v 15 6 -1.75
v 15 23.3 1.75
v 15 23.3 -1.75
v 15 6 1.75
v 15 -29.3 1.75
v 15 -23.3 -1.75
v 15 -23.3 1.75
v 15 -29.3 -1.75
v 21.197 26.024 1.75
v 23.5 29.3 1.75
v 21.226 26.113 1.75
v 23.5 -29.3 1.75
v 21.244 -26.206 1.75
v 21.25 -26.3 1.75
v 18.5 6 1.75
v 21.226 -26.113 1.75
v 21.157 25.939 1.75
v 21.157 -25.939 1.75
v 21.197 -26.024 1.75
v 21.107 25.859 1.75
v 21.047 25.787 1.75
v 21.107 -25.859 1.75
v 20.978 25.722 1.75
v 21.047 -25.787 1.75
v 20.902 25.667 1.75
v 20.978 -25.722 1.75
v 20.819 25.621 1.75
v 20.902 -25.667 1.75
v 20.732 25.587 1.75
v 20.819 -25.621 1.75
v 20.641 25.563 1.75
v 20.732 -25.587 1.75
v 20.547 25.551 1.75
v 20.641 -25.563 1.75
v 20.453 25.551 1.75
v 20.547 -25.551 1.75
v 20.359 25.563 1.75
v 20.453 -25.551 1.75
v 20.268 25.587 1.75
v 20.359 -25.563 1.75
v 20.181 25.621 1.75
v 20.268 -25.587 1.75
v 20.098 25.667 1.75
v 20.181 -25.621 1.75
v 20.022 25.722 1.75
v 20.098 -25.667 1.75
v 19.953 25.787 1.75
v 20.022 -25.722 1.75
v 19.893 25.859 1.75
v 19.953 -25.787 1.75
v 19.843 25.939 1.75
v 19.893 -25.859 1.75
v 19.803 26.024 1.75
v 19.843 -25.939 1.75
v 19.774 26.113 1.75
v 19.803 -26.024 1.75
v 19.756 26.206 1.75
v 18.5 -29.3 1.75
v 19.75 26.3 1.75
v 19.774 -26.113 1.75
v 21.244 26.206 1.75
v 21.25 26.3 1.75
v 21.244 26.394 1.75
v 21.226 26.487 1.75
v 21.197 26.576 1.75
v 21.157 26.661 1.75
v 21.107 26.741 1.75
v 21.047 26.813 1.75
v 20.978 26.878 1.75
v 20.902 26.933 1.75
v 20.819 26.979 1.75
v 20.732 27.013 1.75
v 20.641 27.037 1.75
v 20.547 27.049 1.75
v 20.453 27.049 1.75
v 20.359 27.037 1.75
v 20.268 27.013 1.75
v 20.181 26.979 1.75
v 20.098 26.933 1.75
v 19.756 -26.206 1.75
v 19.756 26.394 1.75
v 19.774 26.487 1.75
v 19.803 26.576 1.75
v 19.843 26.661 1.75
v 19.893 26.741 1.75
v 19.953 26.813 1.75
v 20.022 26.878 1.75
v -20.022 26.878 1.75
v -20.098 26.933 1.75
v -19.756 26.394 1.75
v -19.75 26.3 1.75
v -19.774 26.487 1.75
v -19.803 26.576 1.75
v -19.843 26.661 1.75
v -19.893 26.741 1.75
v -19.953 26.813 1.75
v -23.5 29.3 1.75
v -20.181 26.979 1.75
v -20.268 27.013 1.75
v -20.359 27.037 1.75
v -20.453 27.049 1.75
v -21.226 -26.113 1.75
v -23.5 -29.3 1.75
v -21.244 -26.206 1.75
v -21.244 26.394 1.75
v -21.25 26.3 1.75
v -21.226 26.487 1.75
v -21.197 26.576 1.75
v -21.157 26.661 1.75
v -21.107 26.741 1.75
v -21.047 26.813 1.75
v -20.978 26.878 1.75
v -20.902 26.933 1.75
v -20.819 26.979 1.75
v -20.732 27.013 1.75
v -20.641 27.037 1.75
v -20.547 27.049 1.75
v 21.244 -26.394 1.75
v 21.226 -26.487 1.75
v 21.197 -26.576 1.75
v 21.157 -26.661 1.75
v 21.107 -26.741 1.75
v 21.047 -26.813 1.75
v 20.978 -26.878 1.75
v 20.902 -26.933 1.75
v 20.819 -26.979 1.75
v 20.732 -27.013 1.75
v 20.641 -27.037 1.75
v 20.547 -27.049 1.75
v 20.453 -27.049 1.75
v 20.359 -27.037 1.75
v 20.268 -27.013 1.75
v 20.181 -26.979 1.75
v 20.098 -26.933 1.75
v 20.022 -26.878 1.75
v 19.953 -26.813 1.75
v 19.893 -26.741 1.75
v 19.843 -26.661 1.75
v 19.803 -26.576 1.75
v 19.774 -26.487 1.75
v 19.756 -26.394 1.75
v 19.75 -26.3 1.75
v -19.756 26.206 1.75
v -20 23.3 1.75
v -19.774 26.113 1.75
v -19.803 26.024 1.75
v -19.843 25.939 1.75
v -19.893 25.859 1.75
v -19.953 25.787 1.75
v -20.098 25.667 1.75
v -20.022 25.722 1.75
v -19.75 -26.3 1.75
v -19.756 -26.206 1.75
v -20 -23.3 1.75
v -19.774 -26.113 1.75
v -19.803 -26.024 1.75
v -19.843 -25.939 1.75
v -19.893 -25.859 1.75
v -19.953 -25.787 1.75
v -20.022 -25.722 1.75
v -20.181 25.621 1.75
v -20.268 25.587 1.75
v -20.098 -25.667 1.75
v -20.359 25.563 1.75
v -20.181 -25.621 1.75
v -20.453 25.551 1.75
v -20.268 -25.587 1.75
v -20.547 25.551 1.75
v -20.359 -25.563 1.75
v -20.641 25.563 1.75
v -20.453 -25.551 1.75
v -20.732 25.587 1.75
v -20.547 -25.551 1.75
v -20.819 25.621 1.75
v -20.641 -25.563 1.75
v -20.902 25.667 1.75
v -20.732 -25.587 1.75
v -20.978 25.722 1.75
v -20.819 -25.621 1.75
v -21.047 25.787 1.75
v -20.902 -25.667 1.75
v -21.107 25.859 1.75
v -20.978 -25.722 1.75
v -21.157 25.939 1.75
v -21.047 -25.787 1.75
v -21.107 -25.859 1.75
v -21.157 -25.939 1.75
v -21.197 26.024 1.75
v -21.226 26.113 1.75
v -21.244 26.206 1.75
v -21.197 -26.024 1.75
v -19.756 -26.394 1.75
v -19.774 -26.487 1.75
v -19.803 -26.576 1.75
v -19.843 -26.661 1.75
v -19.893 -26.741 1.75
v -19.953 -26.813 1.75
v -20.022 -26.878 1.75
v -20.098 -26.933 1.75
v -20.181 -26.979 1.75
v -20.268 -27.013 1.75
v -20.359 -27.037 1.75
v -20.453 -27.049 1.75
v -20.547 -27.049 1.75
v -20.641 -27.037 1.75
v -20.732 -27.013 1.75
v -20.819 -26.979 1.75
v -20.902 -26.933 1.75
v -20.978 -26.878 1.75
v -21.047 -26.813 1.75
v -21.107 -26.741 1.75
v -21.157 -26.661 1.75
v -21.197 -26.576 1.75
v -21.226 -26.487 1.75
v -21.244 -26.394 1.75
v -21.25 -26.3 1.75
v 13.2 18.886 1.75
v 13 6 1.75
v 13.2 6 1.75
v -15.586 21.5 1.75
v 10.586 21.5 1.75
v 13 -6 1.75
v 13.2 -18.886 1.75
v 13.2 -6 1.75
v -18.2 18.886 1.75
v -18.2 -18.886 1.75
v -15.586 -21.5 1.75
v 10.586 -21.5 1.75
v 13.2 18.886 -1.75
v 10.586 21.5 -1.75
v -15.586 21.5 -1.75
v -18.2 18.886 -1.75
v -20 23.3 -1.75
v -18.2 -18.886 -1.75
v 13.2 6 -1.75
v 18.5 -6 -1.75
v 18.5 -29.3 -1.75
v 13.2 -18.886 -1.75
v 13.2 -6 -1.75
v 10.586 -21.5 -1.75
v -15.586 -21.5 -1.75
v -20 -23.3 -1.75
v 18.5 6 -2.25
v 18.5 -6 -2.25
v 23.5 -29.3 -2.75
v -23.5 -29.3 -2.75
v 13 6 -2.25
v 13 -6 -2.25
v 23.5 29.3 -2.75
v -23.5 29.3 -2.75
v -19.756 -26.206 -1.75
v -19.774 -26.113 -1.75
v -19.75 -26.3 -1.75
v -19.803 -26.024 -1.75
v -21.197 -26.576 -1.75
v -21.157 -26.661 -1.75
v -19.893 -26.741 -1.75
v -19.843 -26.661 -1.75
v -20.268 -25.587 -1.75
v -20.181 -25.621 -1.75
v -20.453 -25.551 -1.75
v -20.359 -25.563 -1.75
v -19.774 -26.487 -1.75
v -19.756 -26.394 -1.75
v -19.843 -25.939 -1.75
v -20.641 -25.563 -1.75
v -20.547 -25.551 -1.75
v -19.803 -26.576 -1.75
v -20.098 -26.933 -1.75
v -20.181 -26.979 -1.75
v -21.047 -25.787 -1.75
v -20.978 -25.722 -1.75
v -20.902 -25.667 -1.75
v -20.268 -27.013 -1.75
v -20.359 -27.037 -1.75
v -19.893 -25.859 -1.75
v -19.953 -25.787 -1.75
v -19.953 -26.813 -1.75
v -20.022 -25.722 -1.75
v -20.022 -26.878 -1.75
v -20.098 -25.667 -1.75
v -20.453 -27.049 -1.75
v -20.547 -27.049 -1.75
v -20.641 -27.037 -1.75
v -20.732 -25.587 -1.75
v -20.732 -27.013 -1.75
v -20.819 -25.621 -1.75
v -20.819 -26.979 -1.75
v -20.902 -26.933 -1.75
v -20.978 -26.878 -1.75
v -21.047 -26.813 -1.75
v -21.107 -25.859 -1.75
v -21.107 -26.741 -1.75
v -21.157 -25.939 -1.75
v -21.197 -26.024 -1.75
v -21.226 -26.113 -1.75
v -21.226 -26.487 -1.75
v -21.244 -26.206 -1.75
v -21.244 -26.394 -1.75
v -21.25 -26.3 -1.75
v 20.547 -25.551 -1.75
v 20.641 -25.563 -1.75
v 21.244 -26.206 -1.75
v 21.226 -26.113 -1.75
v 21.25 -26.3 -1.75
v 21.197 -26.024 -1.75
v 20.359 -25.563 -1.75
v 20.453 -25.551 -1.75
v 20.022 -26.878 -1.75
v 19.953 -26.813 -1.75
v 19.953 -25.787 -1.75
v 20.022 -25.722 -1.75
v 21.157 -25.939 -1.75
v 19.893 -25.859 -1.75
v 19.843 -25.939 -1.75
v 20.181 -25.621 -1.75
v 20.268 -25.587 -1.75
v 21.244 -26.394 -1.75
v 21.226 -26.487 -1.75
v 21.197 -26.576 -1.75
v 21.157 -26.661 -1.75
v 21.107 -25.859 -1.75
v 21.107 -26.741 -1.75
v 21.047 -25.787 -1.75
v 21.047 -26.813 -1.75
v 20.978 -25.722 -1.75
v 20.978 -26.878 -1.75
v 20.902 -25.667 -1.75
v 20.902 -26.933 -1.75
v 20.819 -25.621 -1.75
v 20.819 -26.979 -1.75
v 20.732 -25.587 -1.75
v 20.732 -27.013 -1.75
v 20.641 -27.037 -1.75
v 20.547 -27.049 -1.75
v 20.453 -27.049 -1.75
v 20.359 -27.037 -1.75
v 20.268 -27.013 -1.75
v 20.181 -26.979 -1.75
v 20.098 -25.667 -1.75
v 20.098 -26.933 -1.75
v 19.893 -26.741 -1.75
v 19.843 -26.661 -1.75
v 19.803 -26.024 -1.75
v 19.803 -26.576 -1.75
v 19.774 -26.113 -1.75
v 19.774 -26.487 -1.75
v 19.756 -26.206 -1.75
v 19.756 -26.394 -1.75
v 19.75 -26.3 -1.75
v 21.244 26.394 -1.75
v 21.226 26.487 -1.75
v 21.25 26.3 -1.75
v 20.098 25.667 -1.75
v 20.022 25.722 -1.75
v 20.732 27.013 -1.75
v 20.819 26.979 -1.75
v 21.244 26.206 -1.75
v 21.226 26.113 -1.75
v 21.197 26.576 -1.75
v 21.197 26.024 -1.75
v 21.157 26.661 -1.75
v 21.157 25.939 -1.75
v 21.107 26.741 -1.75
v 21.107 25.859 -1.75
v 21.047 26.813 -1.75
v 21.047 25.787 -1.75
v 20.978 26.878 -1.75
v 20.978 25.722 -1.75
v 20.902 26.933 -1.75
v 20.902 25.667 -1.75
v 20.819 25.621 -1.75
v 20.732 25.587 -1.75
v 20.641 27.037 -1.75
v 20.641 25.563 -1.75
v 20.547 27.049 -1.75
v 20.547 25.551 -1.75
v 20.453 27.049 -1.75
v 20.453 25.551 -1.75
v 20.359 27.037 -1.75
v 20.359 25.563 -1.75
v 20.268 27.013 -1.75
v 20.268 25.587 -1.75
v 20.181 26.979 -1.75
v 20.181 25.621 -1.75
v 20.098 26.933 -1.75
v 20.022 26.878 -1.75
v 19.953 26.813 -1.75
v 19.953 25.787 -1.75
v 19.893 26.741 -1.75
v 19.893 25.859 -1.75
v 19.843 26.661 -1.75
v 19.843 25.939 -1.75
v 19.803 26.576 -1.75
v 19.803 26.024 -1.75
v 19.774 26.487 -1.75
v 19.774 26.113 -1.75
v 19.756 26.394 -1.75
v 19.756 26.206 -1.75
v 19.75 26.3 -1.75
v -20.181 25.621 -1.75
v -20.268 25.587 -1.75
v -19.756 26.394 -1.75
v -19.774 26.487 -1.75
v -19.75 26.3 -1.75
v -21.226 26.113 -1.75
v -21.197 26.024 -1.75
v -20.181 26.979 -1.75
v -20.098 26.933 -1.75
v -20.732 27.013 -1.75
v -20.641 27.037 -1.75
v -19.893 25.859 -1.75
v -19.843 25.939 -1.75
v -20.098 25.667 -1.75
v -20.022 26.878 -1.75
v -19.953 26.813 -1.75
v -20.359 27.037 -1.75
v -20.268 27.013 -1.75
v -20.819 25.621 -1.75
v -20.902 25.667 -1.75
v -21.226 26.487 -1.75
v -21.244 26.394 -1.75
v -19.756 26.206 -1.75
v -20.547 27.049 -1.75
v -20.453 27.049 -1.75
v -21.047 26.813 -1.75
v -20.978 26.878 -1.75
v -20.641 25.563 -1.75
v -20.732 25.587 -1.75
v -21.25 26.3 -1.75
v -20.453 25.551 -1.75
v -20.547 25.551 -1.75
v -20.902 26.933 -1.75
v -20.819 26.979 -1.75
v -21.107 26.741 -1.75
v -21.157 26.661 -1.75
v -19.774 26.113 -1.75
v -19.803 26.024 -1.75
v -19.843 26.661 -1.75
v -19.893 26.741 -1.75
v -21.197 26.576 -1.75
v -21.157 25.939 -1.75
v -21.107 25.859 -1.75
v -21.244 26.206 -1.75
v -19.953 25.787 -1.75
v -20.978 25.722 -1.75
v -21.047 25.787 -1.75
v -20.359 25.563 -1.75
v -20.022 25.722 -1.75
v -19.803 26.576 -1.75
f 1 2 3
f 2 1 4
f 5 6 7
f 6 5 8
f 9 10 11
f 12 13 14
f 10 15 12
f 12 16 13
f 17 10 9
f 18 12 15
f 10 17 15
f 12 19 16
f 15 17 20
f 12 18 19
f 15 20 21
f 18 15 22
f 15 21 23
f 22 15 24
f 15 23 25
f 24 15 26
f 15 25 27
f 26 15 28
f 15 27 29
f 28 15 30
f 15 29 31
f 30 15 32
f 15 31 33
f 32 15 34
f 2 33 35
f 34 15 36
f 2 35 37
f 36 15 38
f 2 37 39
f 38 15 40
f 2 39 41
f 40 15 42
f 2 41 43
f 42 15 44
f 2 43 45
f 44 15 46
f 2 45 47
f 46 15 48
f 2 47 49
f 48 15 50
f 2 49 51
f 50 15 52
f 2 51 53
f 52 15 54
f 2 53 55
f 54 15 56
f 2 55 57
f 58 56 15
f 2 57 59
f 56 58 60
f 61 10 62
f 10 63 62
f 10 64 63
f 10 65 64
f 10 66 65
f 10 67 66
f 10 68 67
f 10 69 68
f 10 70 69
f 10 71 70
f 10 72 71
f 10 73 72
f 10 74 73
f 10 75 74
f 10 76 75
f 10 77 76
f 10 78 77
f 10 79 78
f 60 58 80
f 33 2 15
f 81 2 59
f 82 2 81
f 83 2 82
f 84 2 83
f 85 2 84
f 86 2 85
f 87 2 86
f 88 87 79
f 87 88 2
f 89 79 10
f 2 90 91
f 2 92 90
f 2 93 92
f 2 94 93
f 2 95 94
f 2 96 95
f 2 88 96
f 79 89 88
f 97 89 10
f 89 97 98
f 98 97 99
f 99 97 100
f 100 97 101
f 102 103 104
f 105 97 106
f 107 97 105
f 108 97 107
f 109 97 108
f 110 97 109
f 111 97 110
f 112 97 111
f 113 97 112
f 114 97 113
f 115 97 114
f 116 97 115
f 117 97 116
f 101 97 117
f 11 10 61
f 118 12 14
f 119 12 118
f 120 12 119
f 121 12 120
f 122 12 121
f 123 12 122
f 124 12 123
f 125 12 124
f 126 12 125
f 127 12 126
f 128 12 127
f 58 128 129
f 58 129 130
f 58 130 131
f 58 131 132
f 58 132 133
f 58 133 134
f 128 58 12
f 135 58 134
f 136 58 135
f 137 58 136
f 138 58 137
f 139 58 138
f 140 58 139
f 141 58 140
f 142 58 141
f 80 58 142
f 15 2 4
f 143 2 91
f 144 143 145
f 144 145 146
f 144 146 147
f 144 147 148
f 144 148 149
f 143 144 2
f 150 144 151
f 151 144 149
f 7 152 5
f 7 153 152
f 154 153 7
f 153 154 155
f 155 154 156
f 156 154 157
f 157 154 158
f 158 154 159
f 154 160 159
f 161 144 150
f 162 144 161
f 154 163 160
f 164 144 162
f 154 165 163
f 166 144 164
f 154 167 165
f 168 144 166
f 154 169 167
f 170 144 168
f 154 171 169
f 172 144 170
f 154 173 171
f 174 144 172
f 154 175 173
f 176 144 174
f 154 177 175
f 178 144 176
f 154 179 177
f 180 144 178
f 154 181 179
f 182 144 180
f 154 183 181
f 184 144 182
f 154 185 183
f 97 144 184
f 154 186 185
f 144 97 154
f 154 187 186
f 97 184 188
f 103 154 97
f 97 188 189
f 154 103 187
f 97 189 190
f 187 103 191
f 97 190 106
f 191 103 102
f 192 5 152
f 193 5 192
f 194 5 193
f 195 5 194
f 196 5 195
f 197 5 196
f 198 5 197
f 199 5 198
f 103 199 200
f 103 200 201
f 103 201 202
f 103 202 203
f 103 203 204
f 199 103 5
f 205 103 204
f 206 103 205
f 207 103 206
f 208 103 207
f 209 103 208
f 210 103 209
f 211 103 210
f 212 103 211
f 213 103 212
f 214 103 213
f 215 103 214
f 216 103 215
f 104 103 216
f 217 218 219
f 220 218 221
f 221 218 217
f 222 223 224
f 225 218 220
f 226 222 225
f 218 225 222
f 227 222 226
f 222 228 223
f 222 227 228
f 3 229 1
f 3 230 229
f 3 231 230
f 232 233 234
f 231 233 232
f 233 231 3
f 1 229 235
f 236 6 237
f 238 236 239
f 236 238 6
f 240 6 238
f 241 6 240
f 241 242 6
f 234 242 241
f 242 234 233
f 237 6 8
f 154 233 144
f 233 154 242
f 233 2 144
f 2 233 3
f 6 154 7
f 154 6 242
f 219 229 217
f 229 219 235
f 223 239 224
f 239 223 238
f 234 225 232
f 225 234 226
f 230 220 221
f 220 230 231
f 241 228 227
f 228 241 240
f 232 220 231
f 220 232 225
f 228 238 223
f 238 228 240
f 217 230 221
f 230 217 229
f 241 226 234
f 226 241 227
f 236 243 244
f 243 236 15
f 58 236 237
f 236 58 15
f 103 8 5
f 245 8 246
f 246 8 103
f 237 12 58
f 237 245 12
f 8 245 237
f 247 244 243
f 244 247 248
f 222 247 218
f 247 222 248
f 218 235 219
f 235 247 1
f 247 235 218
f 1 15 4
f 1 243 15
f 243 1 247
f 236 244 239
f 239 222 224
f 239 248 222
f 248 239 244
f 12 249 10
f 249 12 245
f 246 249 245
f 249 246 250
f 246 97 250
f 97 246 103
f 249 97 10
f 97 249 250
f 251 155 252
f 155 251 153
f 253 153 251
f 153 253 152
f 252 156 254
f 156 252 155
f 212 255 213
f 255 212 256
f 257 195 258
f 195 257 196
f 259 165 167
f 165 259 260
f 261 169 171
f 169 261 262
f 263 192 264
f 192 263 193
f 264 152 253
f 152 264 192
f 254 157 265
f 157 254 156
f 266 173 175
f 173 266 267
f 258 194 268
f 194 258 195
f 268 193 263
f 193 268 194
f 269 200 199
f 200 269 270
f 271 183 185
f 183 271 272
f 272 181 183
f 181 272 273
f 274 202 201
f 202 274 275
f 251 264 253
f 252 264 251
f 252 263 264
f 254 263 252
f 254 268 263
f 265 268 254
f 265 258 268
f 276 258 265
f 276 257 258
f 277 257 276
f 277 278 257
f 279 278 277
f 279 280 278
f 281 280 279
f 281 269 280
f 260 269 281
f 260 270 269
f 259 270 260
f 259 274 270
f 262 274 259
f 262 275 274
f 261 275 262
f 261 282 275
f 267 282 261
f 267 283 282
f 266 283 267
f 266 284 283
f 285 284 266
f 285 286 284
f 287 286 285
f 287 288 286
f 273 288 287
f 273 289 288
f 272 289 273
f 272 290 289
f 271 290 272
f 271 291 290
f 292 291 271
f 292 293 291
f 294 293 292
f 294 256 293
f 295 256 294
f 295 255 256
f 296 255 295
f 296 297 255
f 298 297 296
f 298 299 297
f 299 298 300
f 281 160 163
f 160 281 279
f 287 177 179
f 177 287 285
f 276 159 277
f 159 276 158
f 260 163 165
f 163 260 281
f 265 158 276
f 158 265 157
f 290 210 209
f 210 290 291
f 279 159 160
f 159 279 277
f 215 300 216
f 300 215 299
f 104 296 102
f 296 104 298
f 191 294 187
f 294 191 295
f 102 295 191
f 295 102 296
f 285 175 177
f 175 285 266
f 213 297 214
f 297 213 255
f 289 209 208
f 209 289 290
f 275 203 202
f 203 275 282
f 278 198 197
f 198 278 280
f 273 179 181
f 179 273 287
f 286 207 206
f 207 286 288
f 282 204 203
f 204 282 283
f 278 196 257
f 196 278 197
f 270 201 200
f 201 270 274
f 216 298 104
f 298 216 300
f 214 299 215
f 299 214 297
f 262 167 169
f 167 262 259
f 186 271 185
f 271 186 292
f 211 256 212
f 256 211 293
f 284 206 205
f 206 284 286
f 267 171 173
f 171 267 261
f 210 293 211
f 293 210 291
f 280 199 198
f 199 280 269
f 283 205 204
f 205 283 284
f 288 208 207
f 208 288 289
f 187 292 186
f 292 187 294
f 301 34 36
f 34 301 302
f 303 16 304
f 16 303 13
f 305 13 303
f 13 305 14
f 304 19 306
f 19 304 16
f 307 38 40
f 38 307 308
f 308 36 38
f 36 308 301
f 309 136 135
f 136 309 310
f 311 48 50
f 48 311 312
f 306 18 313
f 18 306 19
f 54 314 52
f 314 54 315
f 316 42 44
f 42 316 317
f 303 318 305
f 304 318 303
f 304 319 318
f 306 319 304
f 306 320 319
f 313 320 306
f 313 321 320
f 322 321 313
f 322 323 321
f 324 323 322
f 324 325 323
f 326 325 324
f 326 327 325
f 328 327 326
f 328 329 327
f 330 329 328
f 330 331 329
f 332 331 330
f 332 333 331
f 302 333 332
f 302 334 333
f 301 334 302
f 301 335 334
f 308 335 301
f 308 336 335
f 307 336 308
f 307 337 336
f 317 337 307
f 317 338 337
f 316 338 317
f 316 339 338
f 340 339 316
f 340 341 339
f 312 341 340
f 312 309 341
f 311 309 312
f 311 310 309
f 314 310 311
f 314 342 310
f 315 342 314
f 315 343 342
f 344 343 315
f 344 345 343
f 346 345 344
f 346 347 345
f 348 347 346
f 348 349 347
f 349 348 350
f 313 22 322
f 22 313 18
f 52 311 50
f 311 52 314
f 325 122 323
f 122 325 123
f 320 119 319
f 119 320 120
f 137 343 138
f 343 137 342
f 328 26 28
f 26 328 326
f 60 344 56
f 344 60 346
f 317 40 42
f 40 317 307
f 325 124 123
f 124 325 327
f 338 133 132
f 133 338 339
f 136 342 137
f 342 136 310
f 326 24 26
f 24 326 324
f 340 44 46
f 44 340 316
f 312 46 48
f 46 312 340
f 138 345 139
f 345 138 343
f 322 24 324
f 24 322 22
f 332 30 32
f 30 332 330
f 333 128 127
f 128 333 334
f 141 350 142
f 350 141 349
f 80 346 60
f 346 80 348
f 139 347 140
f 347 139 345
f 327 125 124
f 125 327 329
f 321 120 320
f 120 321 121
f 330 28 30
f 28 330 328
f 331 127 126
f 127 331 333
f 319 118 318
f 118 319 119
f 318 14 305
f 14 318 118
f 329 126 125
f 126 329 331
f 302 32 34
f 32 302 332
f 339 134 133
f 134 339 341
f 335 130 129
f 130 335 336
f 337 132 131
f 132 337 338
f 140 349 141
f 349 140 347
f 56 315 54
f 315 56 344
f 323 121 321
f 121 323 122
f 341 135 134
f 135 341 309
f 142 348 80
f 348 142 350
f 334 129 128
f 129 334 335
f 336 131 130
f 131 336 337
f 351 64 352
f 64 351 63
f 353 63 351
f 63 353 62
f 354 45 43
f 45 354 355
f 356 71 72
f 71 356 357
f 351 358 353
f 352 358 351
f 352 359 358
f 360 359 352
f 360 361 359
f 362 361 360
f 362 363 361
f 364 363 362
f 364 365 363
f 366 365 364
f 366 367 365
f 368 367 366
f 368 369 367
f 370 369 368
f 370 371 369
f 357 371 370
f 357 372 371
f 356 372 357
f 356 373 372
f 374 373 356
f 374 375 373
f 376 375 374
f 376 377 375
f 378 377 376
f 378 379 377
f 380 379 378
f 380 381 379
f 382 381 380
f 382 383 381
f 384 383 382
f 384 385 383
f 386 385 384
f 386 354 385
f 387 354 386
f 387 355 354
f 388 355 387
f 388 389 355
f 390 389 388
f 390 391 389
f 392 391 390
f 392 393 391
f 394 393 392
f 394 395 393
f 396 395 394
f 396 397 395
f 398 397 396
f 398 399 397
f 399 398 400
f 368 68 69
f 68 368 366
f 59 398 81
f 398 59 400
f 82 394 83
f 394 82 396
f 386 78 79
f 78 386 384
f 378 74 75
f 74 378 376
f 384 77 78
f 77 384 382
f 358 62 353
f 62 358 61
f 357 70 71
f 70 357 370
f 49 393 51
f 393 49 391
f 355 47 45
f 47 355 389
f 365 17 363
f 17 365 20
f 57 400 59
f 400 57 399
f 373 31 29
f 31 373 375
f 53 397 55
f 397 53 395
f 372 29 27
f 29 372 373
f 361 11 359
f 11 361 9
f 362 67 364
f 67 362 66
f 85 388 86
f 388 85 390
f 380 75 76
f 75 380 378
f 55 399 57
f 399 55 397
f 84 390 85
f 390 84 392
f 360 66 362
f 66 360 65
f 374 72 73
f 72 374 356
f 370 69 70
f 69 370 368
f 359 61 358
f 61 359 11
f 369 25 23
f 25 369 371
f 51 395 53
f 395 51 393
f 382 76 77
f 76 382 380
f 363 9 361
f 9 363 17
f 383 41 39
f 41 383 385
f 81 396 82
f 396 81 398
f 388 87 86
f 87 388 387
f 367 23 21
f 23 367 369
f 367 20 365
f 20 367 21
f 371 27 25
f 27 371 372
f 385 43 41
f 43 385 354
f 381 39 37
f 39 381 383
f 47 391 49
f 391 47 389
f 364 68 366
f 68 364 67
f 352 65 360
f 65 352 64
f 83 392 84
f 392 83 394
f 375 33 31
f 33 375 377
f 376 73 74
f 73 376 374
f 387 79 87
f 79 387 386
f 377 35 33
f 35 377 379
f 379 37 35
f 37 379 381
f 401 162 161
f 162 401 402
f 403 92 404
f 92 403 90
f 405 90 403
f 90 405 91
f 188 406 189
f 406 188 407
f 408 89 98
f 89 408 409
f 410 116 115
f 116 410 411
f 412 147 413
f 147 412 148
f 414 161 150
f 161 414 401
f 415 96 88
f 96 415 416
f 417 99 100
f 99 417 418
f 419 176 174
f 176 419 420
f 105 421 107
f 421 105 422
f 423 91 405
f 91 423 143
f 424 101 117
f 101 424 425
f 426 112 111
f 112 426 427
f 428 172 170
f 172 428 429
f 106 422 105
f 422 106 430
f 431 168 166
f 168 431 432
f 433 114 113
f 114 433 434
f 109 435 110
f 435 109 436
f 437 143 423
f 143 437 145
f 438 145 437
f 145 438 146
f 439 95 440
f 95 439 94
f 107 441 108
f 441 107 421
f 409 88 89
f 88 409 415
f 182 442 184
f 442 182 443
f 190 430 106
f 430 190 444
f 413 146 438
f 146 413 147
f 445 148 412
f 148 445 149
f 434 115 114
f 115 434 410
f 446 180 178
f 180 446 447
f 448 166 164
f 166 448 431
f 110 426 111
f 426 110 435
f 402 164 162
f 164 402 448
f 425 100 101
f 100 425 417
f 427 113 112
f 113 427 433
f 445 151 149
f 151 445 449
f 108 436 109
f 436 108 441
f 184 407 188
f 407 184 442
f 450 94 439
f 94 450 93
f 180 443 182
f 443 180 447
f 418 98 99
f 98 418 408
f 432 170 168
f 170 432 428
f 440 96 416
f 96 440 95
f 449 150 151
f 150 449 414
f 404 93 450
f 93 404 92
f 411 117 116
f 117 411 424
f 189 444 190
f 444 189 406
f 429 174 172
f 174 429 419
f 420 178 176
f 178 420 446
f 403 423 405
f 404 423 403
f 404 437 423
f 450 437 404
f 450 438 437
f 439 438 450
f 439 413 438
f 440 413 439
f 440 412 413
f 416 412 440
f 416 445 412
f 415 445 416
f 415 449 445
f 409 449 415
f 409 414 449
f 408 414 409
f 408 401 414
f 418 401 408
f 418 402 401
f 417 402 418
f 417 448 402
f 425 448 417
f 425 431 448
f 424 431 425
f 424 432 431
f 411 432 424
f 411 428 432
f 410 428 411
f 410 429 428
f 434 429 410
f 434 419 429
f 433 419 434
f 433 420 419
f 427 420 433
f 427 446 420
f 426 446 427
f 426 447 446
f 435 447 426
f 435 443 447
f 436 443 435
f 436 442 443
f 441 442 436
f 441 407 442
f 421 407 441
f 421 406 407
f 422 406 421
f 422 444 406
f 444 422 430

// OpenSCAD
// file: Includes.scad
coilWidth = 35;
coilHeight = 46.6;
coilBundleWidth = 1.8;
coilDepth=3.5;
coilBackplate = 1;
coilBorder=6;
$fn=50;
wireWidth=3.5;
wireHeight=3.5;
centerWidth=12;
screHoleOffset = 3;
screwHoleSize = 1.5;
screwHoleSize2 = 2.2;
// main file
include <Includes.scad>;

wireCutoutLength = coilHeight / 2 + coilBorder;

mainCubeWidth = coilWidth+coilBorder*2;
mainCubeHeight = coilHeight+coilBorder*2;
rightBorderSpace = coilBorder- wireWidth;

makeCoilCase();

module makeCoilCase () {
difference() {
    translate([-rightBorderSpace,0,0])
    {
        difference()
        {
            translate([rightBorderSpace,0,-coilBackplate/2]) {
                cube([coilWidth+coilBorder*2,coilHeight+coilBorder*2,coilDepth+coilBackplate],center=true);
            }
            coil();
            wireCutout();
        }
    }

    screwHoleZ = -coilDepth/2;

    translate([-mainCubeWidth/2+screHoleOffset,-mainCubeHeight/2+screHoleOffset,screwHoleZ]) {
        cylinder(d=1.5,h=coilDepth);
    }
    translate([mainCubeWidth/2-screHoleOffset,-mainCubeHeight/2+screHoleOffset,screwHoleZ]) {
        cylinder(d=1.5,h=coilDepth);
    }
    translate([mainCubeWidth/2-screHoleOffset,mainCubeHeight/2-screHoleOffset,screwHoleZ]) {
        cylinder(d=1.5,h=coilDepth);
    }
    translate([-mainCubeWidth/2+screHoleOffset,mainCubeHeight/2-screHoleOffset,screwHoleZ]) {
        cylinder(d=1.5,h=coilDepth);
    }
}
}
module wireCutout () {
translate([ coilWidth/2+wireWidth/2,
            -wireCutoutLength/2,
            coilDepth/2-wireHeight/2])
{
    cube([wireWidth,wireCutoutLength,wireHeight],center=true);
}

translate([ coilWidth/2+wireWidth/2-1,
           0,
            coilDepth/2-wireHeight/2-0.25])
{
    cube([wireWidth+2,centerWidth,wireHeight+0.5],center=true);
}

}

    
module coil () {
    cylinderR = 3;
    roundPosX = coilWidth/2 - coilBundleWidth/2 -cylinderR/2;
    roundPosY = coilHeight/2 - coilBundleWidth/2 -cylinderR/2;
    
    
    translate([-roundPosX, roundPosY, 0])
    rotate([0,0,45]) {
    cube([4,2,coilDepth],center=true);
    }
    
    translate([roundPosX, -roundPosY, 0])
    rotate([0,0,45]) {
    cube([4,2,coilDepth],center=true);
    }
    
    translate([roundPosX, roundPosY, 0])
    rotate([0,0,-45]) {
    cube([4,2,coilDepth],center=true);
    }
    
    translate([-roundPosX, -roundPosY, 0])
    rotate([0,0,-45]) {
    cube([4,2,coilDepth],center=true);
    }
    
    difference() {
    cube([coilWidth,coilHeight,coilDepth],center=true);
        
    cube([coilWidth-(2*coilBundleWidth),coilHeight-(2*coilBundleWidth),coilDepth],center=true);
        
        
        
    }
    
    
}

//import("MM2_roll_mount_large.stl");
